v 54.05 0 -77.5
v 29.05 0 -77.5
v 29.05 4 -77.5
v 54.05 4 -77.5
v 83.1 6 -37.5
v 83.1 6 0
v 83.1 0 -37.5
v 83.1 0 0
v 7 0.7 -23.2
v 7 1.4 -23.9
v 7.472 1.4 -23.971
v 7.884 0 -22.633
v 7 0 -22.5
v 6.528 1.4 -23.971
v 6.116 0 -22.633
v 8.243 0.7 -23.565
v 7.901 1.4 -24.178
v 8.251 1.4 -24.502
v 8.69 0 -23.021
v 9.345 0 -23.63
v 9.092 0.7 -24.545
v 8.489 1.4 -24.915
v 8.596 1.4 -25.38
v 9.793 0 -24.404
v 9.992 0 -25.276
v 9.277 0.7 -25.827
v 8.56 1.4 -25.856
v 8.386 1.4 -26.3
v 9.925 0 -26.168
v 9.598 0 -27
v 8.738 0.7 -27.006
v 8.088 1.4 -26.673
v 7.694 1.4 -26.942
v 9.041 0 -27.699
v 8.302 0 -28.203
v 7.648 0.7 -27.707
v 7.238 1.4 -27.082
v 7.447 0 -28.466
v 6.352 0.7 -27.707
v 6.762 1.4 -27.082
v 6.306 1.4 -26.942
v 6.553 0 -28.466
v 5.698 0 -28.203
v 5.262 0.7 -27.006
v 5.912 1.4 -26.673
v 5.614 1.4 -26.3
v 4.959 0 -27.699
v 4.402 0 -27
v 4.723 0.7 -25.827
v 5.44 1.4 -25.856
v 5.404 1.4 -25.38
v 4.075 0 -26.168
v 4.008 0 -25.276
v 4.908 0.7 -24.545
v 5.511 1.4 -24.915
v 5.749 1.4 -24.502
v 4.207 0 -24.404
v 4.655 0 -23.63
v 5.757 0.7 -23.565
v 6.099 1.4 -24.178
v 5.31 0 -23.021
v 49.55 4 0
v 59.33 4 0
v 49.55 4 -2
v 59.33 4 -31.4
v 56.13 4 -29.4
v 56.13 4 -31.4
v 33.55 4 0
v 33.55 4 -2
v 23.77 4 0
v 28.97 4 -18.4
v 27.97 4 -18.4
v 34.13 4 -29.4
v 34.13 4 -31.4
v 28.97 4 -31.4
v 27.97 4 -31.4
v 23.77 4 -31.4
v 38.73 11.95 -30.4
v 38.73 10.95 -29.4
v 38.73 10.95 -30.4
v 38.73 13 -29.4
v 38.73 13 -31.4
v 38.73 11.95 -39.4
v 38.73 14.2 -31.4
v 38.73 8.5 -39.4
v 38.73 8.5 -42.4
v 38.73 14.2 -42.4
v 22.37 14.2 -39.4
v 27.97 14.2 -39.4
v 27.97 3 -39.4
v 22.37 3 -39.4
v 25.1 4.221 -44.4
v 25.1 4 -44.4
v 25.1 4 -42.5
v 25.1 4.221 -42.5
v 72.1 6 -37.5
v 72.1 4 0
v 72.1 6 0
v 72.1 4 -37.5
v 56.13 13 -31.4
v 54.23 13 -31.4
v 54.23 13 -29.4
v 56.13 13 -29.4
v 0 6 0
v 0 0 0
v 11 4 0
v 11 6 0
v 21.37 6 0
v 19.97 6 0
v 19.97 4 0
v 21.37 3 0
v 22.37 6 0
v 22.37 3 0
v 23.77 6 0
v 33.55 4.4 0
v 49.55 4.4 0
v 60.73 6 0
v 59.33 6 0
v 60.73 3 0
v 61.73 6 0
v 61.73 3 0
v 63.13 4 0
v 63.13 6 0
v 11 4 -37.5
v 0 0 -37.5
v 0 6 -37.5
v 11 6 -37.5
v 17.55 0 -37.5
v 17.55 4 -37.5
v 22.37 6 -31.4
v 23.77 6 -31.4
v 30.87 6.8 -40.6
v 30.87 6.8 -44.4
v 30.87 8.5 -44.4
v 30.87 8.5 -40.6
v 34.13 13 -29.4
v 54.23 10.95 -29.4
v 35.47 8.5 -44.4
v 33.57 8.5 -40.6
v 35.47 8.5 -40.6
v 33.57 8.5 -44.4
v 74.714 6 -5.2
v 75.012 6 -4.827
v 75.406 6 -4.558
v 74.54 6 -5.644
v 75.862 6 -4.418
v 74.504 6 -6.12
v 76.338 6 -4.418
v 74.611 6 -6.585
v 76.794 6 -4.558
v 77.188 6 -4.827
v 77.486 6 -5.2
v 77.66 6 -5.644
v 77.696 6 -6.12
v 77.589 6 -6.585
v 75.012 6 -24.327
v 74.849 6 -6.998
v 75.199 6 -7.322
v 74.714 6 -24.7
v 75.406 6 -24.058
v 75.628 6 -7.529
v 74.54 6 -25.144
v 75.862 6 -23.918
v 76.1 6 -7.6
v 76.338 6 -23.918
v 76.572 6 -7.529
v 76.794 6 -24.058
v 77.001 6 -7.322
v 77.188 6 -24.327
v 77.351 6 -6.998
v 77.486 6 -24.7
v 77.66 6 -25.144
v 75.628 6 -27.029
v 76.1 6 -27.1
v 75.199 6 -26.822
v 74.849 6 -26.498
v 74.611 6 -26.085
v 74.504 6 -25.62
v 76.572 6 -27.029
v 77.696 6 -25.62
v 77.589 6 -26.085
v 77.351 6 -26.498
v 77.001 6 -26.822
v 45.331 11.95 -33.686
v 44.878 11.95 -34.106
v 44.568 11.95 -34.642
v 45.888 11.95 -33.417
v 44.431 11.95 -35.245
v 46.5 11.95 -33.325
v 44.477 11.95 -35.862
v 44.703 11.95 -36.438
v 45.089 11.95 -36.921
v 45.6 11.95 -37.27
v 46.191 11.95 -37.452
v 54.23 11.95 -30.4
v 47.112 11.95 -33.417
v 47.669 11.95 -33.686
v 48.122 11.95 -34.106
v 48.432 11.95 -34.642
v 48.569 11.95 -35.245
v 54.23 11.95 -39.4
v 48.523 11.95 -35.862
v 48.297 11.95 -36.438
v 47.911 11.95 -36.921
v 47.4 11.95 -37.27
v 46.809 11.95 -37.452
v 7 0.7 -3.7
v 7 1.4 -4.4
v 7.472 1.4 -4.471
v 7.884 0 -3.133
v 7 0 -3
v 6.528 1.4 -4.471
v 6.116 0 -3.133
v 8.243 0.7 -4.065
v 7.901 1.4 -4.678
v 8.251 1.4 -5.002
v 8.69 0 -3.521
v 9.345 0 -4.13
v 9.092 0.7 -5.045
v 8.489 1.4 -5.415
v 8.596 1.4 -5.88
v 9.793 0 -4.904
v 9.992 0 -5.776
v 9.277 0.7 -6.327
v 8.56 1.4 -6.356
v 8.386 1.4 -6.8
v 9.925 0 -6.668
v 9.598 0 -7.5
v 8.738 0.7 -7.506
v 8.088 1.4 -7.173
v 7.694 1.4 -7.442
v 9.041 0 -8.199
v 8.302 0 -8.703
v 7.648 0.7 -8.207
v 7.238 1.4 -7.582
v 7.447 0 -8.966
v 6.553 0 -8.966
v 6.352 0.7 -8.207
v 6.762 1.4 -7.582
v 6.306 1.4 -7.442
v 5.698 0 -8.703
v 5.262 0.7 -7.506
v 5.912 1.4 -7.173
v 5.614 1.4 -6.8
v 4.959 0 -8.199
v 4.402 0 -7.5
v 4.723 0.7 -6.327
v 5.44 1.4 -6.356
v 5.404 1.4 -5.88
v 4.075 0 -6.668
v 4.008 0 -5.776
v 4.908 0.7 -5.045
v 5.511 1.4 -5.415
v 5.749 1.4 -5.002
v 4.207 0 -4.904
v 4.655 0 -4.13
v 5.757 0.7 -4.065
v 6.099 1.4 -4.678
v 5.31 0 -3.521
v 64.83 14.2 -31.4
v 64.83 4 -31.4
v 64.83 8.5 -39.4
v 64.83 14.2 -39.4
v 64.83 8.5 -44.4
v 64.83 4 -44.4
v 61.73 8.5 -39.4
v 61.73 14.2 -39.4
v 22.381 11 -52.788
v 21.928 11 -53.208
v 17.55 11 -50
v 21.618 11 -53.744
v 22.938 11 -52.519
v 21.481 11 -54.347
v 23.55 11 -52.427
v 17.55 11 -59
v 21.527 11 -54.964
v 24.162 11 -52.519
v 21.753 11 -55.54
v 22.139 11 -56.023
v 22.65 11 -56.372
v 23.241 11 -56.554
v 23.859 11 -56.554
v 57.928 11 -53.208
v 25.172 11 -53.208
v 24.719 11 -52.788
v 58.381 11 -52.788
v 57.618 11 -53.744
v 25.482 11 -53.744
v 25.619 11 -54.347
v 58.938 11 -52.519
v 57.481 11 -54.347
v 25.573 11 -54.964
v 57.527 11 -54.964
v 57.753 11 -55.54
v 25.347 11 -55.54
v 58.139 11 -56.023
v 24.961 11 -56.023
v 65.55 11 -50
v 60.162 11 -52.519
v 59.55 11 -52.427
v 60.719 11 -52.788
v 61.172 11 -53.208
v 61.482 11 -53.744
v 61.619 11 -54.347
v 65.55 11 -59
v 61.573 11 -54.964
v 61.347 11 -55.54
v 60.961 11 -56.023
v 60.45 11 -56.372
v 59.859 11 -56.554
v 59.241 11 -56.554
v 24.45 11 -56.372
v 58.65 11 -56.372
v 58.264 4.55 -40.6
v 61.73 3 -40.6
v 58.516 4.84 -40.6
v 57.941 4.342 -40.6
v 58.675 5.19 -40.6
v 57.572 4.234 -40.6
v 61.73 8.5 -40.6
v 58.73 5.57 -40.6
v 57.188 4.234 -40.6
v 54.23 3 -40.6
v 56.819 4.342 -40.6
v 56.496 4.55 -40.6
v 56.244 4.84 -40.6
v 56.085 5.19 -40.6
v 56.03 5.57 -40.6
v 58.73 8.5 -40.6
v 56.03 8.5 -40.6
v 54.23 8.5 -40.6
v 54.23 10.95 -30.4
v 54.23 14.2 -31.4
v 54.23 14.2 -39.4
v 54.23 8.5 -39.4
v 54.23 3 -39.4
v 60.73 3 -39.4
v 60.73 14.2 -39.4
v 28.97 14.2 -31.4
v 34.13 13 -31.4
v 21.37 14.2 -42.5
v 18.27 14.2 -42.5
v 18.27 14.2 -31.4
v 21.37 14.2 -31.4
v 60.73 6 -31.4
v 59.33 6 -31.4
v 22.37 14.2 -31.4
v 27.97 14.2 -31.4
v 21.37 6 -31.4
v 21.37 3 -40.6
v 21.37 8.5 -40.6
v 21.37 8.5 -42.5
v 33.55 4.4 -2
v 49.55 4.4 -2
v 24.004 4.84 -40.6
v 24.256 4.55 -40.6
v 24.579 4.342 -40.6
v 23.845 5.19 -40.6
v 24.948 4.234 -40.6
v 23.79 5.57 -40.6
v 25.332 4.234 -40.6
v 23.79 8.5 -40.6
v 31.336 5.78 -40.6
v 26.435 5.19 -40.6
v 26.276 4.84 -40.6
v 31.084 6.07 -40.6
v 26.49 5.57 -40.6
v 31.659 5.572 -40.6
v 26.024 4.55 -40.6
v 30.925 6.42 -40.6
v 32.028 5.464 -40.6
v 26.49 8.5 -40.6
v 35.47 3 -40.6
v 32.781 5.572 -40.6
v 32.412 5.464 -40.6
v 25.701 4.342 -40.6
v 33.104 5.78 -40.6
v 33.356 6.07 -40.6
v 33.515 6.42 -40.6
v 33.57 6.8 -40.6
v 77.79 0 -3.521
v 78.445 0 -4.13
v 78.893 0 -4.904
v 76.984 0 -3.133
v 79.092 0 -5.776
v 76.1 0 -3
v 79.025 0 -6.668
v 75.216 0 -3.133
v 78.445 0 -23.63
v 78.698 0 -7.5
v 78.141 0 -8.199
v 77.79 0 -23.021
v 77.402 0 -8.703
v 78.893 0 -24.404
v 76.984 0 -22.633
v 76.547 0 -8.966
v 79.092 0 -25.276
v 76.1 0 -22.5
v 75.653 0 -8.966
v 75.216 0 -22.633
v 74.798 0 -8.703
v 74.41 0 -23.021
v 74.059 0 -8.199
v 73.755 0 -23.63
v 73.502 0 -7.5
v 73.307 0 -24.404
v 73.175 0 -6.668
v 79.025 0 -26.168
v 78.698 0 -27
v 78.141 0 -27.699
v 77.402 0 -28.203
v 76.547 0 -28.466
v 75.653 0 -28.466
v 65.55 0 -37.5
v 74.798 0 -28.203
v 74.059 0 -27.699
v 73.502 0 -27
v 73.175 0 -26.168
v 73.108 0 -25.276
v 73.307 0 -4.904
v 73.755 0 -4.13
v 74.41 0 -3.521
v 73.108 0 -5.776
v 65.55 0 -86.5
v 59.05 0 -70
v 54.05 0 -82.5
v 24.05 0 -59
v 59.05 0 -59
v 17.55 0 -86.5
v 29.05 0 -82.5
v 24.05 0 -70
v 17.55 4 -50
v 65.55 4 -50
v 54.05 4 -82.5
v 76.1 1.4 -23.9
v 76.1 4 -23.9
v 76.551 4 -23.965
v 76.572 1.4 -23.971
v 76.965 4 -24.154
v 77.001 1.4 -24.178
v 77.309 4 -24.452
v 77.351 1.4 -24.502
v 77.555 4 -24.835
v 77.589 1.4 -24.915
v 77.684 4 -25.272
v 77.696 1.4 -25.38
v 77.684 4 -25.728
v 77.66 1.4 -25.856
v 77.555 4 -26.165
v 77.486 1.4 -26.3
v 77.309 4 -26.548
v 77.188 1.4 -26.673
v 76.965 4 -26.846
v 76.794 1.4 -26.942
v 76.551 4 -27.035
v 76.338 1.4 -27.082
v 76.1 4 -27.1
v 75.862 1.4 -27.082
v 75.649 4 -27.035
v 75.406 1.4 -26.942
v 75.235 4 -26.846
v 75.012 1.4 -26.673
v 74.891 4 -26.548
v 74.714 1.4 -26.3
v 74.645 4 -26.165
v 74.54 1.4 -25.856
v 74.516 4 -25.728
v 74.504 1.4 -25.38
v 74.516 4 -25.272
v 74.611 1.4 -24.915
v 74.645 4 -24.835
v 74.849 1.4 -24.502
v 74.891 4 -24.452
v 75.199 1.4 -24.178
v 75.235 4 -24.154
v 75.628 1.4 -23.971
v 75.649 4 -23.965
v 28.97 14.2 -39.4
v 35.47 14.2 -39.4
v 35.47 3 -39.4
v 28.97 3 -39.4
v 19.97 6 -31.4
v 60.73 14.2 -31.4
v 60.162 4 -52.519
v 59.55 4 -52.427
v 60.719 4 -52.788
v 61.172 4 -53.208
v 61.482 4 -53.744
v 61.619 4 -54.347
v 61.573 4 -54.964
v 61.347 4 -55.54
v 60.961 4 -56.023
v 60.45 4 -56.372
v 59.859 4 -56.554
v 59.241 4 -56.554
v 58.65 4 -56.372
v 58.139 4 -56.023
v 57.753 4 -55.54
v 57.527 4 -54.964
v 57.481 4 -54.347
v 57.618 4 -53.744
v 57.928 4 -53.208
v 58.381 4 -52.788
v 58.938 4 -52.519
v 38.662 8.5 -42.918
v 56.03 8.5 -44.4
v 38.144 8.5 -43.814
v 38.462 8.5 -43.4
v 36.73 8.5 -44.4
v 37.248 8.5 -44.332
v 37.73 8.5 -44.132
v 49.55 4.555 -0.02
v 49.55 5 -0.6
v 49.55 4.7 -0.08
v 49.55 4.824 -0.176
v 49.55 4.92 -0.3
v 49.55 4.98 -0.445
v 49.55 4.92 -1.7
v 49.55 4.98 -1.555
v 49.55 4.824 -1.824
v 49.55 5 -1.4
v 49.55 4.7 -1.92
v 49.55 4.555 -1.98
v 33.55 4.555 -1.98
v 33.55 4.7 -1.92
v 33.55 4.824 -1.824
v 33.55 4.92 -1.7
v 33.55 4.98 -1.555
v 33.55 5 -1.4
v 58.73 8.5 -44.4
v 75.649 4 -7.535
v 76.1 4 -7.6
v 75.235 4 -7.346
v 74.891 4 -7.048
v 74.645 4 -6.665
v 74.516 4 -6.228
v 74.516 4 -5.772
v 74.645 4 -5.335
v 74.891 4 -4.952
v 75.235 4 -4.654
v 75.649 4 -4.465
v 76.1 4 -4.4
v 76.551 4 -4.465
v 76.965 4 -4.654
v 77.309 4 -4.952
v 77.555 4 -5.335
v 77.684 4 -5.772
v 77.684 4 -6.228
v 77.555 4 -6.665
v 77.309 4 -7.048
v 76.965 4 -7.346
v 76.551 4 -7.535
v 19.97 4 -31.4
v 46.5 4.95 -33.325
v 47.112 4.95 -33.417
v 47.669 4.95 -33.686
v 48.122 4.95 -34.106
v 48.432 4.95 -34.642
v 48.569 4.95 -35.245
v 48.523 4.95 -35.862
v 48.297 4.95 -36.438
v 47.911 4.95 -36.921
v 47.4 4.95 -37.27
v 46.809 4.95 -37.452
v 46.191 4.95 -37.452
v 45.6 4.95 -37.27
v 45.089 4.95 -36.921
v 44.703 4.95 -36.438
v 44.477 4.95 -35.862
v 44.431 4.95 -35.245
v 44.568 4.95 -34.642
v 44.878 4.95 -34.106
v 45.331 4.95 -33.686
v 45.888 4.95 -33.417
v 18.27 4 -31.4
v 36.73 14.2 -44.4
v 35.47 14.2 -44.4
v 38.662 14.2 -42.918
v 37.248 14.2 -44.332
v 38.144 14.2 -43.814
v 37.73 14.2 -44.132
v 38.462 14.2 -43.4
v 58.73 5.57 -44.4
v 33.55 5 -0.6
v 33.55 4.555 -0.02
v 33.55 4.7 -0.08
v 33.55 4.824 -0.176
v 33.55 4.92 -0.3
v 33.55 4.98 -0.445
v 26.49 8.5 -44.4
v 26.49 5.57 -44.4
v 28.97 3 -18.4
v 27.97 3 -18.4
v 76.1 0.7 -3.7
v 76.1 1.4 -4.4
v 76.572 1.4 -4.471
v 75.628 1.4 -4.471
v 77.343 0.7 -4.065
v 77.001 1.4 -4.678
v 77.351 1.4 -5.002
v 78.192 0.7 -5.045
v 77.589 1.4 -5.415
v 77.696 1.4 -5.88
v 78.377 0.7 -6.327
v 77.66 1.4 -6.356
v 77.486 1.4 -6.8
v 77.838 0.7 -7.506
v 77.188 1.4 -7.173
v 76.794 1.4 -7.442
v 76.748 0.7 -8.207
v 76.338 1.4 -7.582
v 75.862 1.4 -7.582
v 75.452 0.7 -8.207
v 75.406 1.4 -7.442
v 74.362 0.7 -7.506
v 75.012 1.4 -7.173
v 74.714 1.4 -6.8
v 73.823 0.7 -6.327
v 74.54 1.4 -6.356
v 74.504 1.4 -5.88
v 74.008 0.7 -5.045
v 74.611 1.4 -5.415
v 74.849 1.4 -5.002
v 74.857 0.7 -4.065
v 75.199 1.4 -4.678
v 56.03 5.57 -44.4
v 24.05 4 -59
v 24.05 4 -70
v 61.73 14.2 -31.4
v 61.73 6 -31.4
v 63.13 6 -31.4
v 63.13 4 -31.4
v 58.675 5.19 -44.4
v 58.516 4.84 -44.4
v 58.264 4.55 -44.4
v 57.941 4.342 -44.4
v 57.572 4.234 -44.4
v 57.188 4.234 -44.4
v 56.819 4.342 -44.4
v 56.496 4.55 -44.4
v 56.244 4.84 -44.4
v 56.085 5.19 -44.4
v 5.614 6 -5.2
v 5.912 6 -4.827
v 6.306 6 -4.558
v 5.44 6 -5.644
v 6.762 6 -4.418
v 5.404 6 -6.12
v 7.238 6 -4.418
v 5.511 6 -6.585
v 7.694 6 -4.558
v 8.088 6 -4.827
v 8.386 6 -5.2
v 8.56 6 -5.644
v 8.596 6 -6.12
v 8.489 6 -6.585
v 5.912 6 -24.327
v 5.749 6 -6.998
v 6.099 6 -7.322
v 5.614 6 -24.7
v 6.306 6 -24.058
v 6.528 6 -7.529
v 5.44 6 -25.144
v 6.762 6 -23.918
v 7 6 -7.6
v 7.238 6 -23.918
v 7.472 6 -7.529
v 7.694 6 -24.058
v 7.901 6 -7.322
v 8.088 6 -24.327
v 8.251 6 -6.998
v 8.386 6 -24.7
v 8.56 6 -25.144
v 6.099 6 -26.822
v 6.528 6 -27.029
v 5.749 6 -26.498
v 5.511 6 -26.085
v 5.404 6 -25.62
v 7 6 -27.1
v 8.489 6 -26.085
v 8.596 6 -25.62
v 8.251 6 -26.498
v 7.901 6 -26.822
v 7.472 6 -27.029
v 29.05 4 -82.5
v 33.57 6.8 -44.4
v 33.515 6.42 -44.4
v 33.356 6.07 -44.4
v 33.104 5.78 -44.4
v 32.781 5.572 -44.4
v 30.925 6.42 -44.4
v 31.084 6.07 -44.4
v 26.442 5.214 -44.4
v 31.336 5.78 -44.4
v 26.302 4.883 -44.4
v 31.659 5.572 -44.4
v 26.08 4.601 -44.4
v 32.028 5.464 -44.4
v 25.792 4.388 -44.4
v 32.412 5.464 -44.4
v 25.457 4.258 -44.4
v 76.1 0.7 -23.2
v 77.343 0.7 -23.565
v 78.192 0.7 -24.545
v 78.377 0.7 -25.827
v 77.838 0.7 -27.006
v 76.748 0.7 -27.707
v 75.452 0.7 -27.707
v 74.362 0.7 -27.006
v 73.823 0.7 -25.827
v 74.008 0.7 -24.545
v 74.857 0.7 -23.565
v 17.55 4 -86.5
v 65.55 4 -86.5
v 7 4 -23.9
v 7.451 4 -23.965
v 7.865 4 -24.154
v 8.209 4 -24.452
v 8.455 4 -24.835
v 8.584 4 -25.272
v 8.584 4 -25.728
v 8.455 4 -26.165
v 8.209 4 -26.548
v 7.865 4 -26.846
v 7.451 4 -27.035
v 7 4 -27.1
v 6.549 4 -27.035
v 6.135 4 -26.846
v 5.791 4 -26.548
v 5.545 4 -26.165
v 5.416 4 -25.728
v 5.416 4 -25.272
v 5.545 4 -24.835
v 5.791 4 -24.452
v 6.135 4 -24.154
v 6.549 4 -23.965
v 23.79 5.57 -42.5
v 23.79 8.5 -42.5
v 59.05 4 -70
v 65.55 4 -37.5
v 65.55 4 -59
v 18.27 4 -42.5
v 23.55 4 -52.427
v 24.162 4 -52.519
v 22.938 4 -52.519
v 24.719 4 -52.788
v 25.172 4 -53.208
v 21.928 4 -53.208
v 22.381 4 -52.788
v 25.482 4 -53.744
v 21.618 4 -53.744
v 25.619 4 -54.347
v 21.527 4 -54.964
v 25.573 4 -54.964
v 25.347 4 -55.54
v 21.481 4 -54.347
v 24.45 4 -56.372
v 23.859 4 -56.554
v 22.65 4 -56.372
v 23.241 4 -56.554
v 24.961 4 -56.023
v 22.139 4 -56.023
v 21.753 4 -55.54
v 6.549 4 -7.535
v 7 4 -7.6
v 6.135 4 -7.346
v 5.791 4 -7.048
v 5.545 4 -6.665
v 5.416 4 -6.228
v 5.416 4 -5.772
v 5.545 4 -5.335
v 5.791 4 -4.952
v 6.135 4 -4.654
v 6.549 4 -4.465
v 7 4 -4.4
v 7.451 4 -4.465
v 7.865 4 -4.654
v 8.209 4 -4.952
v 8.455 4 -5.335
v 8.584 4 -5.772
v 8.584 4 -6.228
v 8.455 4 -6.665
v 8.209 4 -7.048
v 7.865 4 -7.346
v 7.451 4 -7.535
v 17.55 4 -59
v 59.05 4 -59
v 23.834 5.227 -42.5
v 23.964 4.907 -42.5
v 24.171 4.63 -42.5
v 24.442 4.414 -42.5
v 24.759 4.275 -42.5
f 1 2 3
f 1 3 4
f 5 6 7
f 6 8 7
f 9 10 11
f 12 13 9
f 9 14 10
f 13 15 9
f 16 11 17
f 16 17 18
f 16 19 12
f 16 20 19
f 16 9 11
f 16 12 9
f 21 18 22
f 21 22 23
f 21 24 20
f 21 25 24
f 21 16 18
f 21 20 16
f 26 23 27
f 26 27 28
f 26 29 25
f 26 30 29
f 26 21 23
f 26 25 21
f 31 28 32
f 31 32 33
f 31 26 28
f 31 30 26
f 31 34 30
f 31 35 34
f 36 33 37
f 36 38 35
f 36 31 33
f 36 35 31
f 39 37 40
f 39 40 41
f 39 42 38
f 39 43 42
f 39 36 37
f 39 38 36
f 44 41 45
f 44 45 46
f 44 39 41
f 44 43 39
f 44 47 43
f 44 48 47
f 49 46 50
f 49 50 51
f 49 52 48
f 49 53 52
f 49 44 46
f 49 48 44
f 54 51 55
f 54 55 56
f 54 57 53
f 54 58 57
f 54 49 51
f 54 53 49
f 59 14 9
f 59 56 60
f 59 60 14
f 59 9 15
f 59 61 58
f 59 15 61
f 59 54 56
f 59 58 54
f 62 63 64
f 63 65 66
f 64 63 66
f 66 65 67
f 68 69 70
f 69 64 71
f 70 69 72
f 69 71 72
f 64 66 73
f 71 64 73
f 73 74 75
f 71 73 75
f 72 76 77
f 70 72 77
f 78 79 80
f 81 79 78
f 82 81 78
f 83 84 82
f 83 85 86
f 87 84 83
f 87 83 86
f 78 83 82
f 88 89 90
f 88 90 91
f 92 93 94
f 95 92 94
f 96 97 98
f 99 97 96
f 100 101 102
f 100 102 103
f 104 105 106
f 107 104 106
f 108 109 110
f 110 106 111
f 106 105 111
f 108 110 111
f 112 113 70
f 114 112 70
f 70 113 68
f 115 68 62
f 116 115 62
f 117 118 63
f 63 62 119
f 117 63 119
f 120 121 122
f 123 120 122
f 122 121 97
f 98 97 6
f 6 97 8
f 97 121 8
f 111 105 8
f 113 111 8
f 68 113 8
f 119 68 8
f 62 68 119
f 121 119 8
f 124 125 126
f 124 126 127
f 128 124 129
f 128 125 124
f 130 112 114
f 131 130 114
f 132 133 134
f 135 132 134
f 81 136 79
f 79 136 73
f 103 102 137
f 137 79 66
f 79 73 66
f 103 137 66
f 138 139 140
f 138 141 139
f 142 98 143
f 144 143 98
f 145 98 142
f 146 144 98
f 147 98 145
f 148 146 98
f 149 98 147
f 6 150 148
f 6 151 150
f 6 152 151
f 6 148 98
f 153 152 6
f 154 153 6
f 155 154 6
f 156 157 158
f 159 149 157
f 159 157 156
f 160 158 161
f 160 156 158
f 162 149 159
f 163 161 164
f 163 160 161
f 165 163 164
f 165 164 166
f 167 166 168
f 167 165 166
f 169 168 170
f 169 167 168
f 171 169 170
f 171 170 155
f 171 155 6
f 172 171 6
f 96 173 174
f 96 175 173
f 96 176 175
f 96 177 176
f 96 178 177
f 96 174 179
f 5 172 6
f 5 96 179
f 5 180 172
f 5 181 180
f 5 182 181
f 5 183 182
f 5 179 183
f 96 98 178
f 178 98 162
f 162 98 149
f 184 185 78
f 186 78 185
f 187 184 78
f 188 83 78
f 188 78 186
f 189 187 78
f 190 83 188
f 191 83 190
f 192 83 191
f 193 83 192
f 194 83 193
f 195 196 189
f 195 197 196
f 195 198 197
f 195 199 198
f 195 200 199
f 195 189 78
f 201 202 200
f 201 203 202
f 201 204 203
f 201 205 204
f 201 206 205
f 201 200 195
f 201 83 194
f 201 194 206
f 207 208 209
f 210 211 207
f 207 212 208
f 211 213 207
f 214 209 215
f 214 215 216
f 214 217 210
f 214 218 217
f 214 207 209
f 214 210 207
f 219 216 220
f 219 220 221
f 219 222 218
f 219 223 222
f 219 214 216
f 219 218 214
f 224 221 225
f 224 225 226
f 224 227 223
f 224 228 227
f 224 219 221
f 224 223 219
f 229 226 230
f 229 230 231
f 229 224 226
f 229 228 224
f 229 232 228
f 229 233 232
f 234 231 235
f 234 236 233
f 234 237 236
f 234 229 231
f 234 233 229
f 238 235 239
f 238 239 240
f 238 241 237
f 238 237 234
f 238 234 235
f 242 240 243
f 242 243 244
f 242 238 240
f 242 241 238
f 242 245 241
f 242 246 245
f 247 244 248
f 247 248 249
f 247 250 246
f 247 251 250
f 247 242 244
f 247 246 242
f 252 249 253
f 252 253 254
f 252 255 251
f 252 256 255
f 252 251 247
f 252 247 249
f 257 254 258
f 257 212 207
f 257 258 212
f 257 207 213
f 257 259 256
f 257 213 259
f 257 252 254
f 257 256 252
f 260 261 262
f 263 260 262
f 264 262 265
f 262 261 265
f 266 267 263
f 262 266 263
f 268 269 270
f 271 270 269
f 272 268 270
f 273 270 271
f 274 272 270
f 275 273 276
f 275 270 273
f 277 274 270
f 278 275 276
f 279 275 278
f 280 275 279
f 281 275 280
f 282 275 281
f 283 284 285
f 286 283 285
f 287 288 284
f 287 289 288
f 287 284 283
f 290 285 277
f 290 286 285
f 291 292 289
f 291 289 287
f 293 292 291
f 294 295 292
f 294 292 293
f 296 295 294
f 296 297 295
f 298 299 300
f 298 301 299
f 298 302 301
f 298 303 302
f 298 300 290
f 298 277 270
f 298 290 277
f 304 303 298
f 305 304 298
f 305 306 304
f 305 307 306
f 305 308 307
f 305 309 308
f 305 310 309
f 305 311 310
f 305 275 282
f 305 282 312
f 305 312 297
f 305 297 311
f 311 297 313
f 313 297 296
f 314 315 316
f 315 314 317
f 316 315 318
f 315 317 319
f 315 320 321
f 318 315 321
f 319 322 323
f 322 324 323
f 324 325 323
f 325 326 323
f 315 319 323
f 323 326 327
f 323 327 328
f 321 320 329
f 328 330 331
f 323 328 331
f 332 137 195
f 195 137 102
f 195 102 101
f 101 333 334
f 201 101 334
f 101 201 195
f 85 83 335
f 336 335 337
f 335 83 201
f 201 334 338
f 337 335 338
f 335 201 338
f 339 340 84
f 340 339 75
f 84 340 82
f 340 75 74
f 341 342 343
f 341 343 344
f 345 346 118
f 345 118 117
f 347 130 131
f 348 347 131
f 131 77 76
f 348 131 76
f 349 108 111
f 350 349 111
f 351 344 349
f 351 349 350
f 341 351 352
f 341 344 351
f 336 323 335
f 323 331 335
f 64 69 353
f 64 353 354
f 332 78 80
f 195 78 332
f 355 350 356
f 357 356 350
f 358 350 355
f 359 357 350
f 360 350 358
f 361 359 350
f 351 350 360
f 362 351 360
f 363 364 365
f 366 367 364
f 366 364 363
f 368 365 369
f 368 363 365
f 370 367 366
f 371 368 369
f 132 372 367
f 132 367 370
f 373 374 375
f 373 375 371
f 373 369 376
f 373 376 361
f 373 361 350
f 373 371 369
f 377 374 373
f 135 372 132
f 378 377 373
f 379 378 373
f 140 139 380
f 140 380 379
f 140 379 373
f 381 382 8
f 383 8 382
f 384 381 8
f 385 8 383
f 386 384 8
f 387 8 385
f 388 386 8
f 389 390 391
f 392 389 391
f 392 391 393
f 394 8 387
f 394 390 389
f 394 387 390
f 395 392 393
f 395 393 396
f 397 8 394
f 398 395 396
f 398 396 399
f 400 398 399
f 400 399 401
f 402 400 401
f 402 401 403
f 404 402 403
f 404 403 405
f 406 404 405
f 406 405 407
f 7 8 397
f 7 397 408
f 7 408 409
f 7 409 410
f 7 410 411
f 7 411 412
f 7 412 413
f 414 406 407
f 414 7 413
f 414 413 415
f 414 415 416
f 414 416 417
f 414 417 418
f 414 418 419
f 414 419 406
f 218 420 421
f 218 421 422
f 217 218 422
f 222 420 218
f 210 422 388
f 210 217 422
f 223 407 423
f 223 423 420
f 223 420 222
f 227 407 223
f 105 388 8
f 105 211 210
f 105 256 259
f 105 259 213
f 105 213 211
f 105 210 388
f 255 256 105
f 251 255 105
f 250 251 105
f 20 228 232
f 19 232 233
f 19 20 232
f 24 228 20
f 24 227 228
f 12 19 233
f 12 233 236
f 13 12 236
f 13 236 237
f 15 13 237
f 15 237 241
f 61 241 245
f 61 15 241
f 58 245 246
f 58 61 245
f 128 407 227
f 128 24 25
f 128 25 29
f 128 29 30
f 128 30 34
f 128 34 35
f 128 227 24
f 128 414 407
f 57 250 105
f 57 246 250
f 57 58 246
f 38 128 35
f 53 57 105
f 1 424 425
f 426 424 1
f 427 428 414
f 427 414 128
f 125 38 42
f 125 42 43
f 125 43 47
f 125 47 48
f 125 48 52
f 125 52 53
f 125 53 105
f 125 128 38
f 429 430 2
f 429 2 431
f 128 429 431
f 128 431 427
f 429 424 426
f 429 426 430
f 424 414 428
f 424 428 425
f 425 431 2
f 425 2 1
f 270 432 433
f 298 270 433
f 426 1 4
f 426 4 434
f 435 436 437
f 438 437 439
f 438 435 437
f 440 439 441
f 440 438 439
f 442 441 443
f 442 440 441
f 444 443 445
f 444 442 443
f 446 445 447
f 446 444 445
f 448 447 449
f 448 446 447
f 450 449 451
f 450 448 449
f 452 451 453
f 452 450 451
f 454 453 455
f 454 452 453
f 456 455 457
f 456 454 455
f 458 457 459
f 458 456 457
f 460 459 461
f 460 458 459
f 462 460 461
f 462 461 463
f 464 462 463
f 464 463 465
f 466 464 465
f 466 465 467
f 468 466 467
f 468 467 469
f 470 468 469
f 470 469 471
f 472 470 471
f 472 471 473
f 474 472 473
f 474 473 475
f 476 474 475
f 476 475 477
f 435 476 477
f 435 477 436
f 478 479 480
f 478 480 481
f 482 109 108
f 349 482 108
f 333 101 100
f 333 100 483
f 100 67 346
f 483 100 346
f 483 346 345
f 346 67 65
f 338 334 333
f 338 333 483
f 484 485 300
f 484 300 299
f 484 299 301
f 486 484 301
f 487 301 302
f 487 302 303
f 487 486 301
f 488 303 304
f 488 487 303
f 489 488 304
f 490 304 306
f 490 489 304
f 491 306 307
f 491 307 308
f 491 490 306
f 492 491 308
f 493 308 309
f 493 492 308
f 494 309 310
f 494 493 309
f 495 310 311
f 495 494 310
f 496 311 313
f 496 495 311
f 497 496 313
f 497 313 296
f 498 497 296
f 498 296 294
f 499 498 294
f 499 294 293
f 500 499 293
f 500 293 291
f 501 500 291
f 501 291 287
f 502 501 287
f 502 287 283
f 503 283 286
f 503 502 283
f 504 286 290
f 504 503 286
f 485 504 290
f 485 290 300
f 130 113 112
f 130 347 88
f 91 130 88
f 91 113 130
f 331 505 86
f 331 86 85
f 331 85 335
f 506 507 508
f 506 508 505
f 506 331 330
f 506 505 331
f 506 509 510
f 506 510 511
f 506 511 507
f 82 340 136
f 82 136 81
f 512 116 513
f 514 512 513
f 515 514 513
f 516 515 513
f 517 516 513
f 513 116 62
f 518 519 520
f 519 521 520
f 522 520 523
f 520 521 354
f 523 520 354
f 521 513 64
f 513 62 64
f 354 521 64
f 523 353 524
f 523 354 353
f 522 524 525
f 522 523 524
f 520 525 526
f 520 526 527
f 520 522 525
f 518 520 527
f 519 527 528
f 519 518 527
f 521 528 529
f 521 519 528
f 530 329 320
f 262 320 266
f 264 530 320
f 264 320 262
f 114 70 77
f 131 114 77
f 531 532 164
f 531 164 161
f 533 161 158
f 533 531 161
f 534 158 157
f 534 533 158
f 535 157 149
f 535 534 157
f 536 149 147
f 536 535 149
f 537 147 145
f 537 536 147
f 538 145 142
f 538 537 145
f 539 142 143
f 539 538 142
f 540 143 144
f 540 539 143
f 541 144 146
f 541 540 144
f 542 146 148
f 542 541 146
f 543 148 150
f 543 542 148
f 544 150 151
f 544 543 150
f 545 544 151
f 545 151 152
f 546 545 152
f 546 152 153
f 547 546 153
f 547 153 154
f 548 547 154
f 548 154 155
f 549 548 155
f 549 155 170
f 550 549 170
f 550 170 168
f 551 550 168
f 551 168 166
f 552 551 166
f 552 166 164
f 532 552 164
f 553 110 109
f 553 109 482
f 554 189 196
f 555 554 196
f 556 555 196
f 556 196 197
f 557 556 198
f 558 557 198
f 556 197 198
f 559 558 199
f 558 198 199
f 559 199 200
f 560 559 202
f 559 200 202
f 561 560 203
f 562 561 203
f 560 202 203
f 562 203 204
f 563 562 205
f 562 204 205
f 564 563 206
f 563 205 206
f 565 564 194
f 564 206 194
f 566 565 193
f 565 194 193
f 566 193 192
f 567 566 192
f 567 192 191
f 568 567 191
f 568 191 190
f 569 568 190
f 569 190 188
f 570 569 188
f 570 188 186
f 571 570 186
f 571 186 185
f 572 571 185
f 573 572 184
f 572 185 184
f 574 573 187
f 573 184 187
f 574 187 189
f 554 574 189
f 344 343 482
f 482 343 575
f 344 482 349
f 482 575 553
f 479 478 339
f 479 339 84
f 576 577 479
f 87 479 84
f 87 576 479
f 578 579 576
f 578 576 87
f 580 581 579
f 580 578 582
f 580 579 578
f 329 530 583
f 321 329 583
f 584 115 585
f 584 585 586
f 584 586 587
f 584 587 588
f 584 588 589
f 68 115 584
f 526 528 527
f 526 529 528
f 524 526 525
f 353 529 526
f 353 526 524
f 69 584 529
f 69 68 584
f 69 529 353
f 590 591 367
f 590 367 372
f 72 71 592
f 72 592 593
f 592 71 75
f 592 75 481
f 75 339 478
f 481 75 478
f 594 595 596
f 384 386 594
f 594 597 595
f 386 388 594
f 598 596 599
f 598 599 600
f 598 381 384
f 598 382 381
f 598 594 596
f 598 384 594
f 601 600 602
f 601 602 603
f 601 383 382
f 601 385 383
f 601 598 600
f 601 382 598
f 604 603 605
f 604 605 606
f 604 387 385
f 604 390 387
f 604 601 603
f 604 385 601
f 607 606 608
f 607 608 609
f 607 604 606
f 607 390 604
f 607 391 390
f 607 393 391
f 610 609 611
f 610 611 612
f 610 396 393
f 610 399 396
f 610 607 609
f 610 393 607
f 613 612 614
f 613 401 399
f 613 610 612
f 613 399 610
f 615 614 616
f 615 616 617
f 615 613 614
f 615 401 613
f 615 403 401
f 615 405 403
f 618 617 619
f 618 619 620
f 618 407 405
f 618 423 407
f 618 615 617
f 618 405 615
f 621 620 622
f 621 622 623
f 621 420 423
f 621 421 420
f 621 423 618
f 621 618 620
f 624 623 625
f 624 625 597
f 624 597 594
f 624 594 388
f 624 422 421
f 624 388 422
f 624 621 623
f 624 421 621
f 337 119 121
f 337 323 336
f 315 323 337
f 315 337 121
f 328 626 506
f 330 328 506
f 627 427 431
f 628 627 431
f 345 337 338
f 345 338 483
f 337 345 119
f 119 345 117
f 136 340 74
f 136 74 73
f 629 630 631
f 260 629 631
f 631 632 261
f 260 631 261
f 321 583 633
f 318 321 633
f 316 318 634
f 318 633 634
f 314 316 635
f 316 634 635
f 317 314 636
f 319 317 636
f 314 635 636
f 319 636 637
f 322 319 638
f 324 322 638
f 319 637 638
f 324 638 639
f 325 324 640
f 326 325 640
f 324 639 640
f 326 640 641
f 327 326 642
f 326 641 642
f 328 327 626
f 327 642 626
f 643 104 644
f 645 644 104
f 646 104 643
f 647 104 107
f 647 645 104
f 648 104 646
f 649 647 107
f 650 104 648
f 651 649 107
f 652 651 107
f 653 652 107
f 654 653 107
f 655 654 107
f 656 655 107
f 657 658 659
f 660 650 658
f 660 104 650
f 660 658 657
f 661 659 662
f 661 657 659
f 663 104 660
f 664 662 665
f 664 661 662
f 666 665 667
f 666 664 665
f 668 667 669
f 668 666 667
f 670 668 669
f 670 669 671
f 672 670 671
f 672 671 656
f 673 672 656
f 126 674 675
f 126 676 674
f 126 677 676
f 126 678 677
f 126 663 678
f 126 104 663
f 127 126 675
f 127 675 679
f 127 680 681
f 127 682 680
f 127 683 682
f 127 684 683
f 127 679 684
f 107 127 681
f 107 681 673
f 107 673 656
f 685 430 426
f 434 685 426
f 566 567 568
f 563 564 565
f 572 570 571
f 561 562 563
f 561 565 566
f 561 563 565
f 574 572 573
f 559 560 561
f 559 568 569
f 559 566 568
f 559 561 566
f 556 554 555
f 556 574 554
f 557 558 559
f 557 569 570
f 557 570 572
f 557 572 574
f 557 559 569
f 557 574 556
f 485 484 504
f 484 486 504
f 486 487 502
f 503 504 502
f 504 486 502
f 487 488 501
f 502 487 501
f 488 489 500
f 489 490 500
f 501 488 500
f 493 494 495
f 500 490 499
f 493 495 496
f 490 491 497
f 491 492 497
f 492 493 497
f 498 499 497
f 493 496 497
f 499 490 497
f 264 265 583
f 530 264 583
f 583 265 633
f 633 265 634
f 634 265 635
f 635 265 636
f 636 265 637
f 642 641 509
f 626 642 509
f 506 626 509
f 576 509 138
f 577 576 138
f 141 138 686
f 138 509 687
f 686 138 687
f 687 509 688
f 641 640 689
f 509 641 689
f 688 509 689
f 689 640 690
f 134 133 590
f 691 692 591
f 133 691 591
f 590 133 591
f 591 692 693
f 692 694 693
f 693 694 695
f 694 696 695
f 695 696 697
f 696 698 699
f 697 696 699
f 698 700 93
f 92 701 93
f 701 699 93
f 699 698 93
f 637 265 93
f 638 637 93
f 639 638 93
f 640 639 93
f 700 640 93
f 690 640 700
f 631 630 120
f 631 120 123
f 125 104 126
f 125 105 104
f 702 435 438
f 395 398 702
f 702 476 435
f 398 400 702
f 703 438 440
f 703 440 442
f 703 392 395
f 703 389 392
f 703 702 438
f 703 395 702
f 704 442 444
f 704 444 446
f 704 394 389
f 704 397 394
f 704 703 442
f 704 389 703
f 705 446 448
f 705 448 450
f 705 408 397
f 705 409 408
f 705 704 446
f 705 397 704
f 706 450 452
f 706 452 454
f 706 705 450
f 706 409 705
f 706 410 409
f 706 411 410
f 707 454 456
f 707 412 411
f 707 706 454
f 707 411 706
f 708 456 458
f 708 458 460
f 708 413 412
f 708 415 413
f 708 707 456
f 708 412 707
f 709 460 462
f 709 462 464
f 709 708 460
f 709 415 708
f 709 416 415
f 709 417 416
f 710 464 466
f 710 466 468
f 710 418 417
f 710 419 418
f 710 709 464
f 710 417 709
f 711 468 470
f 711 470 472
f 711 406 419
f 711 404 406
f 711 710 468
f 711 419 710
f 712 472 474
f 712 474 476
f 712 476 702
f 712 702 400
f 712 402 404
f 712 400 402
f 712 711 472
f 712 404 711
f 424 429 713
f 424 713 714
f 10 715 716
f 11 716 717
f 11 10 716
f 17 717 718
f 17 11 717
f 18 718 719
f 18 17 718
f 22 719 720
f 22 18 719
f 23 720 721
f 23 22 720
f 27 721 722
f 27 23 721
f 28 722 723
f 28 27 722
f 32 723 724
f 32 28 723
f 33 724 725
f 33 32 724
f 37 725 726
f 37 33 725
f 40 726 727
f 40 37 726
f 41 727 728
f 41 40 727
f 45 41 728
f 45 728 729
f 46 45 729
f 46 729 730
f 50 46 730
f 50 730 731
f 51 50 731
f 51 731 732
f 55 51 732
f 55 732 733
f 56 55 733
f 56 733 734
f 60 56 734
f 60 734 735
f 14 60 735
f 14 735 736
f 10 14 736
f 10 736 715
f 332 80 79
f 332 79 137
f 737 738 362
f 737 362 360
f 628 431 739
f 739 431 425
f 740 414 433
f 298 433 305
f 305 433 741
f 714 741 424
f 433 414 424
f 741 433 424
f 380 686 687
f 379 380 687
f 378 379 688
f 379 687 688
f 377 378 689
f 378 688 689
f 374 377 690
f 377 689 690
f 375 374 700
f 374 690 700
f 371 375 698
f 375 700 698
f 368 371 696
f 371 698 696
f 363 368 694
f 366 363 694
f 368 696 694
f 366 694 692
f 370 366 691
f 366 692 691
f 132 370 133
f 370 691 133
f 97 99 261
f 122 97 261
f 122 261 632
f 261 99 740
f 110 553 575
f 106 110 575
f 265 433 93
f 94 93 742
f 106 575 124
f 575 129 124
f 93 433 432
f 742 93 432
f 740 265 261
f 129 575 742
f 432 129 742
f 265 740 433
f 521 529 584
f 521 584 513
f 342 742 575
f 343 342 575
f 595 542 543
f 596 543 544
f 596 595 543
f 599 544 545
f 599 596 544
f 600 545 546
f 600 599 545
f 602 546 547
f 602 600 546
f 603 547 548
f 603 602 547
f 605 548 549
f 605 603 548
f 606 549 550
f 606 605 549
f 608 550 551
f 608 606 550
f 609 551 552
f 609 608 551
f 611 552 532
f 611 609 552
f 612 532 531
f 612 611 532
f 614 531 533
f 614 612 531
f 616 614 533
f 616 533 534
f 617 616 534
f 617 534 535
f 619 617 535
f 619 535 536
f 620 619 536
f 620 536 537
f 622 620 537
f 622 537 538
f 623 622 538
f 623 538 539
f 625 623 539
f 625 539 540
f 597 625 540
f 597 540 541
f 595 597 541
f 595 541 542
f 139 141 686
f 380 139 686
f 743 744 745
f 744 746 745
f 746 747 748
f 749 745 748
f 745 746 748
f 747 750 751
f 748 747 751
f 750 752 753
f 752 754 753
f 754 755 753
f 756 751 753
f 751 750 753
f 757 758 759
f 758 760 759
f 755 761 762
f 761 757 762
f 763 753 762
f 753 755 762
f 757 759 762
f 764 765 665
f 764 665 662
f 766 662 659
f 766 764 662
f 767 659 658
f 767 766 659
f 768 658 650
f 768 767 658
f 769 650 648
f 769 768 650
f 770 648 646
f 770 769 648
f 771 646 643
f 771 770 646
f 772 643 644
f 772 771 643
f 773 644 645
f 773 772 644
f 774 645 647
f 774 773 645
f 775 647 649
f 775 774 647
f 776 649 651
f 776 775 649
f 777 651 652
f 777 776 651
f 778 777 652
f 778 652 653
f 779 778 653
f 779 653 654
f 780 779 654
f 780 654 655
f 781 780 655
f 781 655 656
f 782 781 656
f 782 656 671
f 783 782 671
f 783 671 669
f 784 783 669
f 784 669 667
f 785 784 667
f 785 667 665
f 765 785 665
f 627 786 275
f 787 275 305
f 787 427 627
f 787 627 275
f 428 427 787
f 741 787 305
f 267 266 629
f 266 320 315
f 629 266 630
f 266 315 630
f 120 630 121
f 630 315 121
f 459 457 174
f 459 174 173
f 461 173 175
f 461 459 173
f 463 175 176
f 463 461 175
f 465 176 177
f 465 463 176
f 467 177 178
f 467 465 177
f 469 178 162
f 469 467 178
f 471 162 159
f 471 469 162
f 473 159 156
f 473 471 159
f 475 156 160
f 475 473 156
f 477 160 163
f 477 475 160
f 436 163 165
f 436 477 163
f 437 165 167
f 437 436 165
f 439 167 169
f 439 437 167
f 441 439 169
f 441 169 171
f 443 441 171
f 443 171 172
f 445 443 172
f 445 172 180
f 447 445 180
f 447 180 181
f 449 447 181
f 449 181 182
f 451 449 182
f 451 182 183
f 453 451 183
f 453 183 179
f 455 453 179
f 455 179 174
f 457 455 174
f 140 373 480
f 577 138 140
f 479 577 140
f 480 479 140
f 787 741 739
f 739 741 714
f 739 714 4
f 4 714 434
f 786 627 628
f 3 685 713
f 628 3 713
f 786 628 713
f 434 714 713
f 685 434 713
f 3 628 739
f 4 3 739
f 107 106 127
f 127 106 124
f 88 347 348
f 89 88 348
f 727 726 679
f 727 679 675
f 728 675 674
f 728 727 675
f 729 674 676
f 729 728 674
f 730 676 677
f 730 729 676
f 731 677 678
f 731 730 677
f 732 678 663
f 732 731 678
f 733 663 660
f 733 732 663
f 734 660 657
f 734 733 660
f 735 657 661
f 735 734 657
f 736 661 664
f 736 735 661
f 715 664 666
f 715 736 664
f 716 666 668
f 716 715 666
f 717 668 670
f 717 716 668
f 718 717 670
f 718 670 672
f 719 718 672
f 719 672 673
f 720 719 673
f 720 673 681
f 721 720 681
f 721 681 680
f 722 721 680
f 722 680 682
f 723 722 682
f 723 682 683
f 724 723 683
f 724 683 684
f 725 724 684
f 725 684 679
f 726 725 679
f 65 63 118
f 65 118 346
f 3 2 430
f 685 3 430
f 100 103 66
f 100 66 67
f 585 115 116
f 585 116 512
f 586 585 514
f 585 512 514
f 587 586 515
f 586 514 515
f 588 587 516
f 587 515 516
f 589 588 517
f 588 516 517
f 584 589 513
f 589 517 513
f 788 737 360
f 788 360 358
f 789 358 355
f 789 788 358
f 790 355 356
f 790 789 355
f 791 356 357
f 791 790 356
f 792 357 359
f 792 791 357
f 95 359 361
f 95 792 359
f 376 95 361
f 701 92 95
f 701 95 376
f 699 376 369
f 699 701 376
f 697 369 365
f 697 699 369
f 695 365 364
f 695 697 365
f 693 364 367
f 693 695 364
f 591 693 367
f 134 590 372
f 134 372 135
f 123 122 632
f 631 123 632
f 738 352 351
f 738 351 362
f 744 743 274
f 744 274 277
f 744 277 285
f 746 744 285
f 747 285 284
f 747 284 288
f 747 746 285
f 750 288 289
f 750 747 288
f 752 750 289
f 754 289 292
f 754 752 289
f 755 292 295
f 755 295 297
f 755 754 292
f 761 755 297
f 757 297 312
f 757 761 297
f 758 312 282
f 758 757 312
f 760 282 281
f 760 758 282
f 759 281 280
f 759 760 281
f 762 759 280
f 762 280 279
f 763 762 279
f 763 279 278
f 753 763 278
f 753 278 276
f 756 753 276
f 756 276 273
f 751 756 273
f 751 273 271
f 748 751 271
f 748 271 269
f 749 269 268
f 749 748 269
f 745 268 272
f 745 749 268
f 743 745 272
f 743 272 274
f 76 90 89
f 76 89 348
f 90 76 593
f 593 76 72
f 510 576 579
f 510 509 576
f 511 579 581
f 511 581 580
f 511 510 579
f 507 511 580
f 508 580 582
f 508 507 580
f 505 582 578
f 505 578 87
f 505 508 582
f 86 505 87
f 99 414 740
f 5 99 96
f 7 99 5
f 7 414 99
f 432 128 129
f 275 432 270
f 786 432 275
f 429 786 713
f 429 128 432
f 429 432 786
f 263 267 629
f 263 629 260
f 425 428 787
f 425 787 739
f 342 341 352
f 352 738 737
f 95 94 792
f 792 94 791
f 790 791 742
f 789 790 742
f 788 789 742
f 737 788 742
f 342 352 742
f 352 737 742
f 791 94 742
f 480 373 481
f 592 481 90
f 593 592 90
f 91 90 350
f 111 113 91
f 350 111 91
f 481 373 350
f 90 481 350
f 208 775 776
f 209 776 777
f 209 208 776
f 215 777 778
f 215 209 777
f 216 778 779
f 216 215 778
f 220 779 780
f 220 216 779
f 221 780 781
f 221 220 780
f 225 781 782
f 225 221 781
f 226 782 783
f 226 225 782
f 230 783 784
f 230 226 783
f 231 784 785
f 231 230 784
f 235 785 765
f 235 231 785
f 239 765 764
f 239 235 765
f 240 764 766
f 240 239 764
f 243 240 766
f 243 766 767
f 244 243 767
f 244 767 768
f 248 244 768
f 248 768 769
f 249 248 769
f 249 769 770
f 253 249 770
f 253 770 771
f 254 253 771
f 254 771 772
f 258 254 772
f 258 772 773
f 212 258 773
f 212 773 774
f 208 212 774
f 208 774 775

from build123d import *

# Parameters (mm, degrees)
SKETCH1_R           = 1.6
SKETCH1_W           = 25
SKETCH1_H           = 5
SKETCH1_W_2         = 35
SKETCH1_H_2         = 11
BOSS_EXTRUDE1_DEPTH = 4
CHAMFER1_SIZE       = 1.4
SKETCH2_W           = 48
SKETCH2_H           = 9
SKETCH2_R           = 2.075
BOSS_EXTRUDE2_DEPTH = 7
SKETCH3_W           = 11
SKETCH3_H           = 37.5
SKETCH3_R           = 1.6
BOSS_EXTRUDE3_DEPTH = 2
SKETCH4_W           = 5.6
SKETCH4_H           = 8
BOSS_EXTRUDE4_DEPTH = 10.2
SKETCH5_W           = 1.4
SKETCH5_H           = 31.4
BOSS_EXTRUDE5_DEPTH = 2
CUT_EXTRUDE1_DEPTH  = 1
SKETCH8_W           = 26.1
SKETCH8_H           = 5
CUT_EXTRUDE2_DEPTH  = 5.7
SKETCH9_W           = 15.5
SKETCH9_H           = 10
CUT_EXTRUDE3_DEPTH  = 2.25
SKETCH10_W          = 4.6
SKETCH10_H          = 2
SKETCH10_W_2        = 1.9
CUT_EXTRUDE4_DEPTH  = 1.2
SKETCH11_W          = 15.5
SKETCH11_H          = 1
CUT_EXTRUDE5_DEPTH  = 1
SKETCH12_R          = 2.075
CUT_EXTRUDE6_DEPTH  = 7
FILLET1_R           = 2
CUT_EXTRUDE7_REACH  = 97.282
SKETCH14_W          = 16
SKETCH14_H          = 2
BOSS_EXTRUDE6_DEPTH = 1
FILLET2_R           = 0.6


with BuildPart() as part:
    # Sketch1 → Boss-Extrude1 (new body)
    with BuildSketch(Plane(origin=(0, 0, 0), x_dir=(1, 0, 0), z_dir=(0, 1, 0))):
        Polygon((0, 0), (0, 37.5), (17.55, 37.5), (17.55, 86.5), (65.55, 86.5), (65.55, 37.5), (83.1, 37.5), (83.1, 0), align=None)
        with Locations(Location((7, 25.5, 0), (0, 0, 270))):
            Circle(SKETCH1_R, mode=Mode.SUBTRACT)
        with Locations(Location((7, 6, 0), (0, 0, 270))):
            Circle(SKETCH1_R, mode=Mode.SUBTRACT)
        with Locations(Location((76.1, 6, 0), (0, 0, 270))):
            Circle(SKETCH1_R, mode=Mode.SUBTRACT)
        with Locations(Location((76.1, 25.5, 0), (0, 0, 270))):
            Circle(SKETCH1_R, mode=Mode.SUBTRACT)
        with Locations((41.55, 80)):
            Rectangle(SKETCH1_W, SKETCH1_H, mode=Mode.SUBTRACT)
        with Locations((41.55, 64.5)):
            Rectangle(SKETCH1_W_2, SKETCH1_H_2, mode=Mode.SUBTRACT)
    extrude(amount=BOSS_EXTRUDE1_DEPTH)

    # Chamfer1
    chamfer1_edges = [part.edges().sort_by_distance(p)[0] for p in [
        (7, 0, -27.1),
        (7, 0, -7.6),
        (76.1, 0, -7.6),
        (76.1, 0, -27.1),
    ]]
    chamfer(chamfer1_edges, length=CHAMFER1_SIZE)

    # Sketch2 → Boss-Extrude2 (add)
    with BuildSketch(Plane(origin=(0, 4, 0), x_dir=(1, 0, 0), z_dir=(0, 1, 0))):
        with Locations((41.55, 54.5)):
            Rectangle(SKETCH2_W, SKETCH2_H)
        with Locations(Location((23.55, 54.502162277, 0), (0, 0, 270))):
            Circle(SKETCH2_R, mode=Mode.SUBTRACT)
        with Locations(Location((59.55, 54.502162277, 0), (0, 0, 270))):
            Circle(SKETCH2_R, mode=Mode.SUBTRACT)
    extrude(amount=BOSS_EXTRUDE2_DEPTH)

    # Sketch3 → Boss-Extrude3 (add)
    # profile 1 of 2: a face of its own
    with BuildSketch(Plane(origin=(0, 4, 0), x_dir=(1, 0, 0), z_dir=(0, 1, 0))):
        with Locations((5.5, 18.75)):
            Rectangle(SKETCH3_W, SKETCH3_H)
        with Locations(Location((7, 25.5, 0), (0, 0, 90))):
            Circle(SKETCH3_R, mode=Mode.SUBTRACT)
        with Locations(Location((7, 6, 0), (0, 0, 90))):
            Circle(SKETCH3_R, mode=Mode.SUBTRACT)
    # profile 2 of 2: a face of its own
    with BuildSketch(Plane(origin=(0, 4, 0), x_dir=(1, 0, 0), z_dir=(0, 1, 0))):
        with Locations((77.6, 18.75)):
            Rectangle(SKETCH3_W, SKETCH3_H)
        with Locations(Location((76.1, 6, 0), (0, 0, 90))):
            Circle(SKETCH3_R, mode=Mode.SUBTRACT)
        with Locations(Location((76.1, 25.5, 0), (0, 0, 90))):
            Circle(SKETCH3_R, mode=Mode.SUBTRACT)
    extrude(amount=BOSS_EXTRUDE3_DEPTH)

    # Sketch4 → Boss-Extrude4 (add)
    with BuildSketch(Plane(origin=(0, 4, 0), x_dir=(1, 0, 0), z_dir=(0, 1, 0))):
        Polygon((18.27, 42.5), (18.27, 31.4), (21.37, 31.4), (21.37, 40.6), (35.47, 40.6), (35.47, 39.4), (28.97, 39.4), (28.97, 31.4), (34.13, 31.4), (34.13, 29.4), (56.13, 29.4), (56.13, 31.4), (60.73, 31.4), (60.73, 39.4), (54.23, 39.4), (54.23, 40.6), (61.73, 40.6), (61.73, 31.4), (64.83, 31.4), (64.83, 44.4), (25.1, 44.4), (25.1, 42.5), align=None)
        with Locations((25.17, 35.4)):
            Rectangle(SKETCH4_W, SKETCH4_H)
    extrude(amount=BOSS_EXTRUDE4_DEPTH)

    # Sketch5 → Boss-Extrude5 (add)
    with BuildSketch(Plane(origin=(0, 4, 0), x_dir=(1, 0, 0), z_dir=(0, 1, 0))):
        with Locations((20.67, 15.7)):
            Rectangle(SKETCH5_W, SKETCH5_H)
        with Locations((23.07, 15.7)):
            Rectangle(SKETCH5_W, SKETCH5_H)
        with Locations((60.03, 15.7)):
            Rectangle(SKETCH5_W, SKETCH5_H)
        with Locations((62.43, 15.7)):
            Rectangle(SKETCH5_W, SKETCH5_H)
    extrude(amount=BOSS_EXTRUDE5_DEPTH)

    # Sketch7 → Cut-Extrude1 (cut)
    with BuildSketch(Plane(origin=(0, 4, 0), x_dir=(1, 0, 0), z_dir=(0, 1, 0))):
        Polygon((28.97, 31.4), (28.97, 18.4), (27.97, 18.4), (27.97, 31.4), (27.97, 39.4), (22.37, 39.4), (22.37, 0), (21.37, 0), (21.37, 40.6), (35.47, 40.6), (35.47, 39.4), (28.97, 39.4), align=None)
        Polygon((60.73, 0), (61.73, 0), (61.73, 40.6), (54.23, 40.6), (54.23, 39.4), (60.73, 39.4), align=None)
    extrude(amount=-CUT_EXTRUDE1_DEPTH, mode=Mode.SUBTRACT)

    # Sketch8 → Cut-Extrude2 (cut)
    with BuildSketch(Plane(origin=(0, 14.2, 0), x_dir=(1, 0, 0), z_dir=(0, 1, 0))):
        Polygon((35.47, 40.6), (35.47, 44.4), (25.1, 44.4), (25.1, 42.5), (21.37, 42.5), (21.37, 40.6), align=None)
        with Locations((51.78, 41.9)):
            Rectangle(SKETCH8_W, SKETCH8_H)
    extrude(amount=-CUT_EXTRUDE2_DEPTH, mode=Mode.SUBTRACT)

    # Sketch9 → Cut-Extrude3 (cut)
    with BuildSketch(Plane(origin=(0, 14.2, 0), x_dir=(1, 0, 0), z_dir=(0, 1, 0))):
        with Locations((46.48, 34.4)):
            Rectangle(SKETCH9_W, SKETCH9_H)
    extrude(amount=-CUT_EXTRUDE3_DEPTH, mode=Mode.SUBTRACT)

    # Sketch10 → Cut-Extrude4 (cut)
    with BuildSketch(Plane(origin=(0, 14.2, 0), x_dir=(1, 0, 0), z_dir=(0, 1, 0))):
        with Locations((36.43, 30.4)):
            Rectangle(SKETCH10_W, SKETCH10_H)
        with Locations((55.18, 30.4)):
            Rectangle(SKETCH10_W_2, SKETCH10_H)
    extrude(amount=-CUT_EXTRUDE4_DEPTH, mode=Mode.SUBTRACT)

    # Sketch11 → Cut-Extrude5 (cut)
    with BuildSketch(Plane(origin=(0, 11.95, 0), x_dir=(1, 0, 0), z_dir=(0, 1, 0))):
        with Locations((46.48, 29.9)):
            Rectangle(SKETCH11_W, SKETCH11_H)
    extrude(amount=-CUT_EXTRUDE5_DEPTH, mode=Mode.SUBTRACT)

    # Sketch12 → Cut-Extrude6 (cut)
    with BuildSketch(Plane(origin=(0, 11.95, 0), x_dir=(1, 0, 0), z_dir=(0, 1, 0))):
        with Locations(Location((46.5, 35.4, 0), (0, 0, 270))):
            Circle(SKETCH12_R)
    extrude(amount=-CUT_EXTRUDE6_DEPTH, mode=Mode.SUBTRACT)

    # Fillet1
    fillet1_edges = [part.edges().sort_by_distance(p)[0] for p in [
        (38.73, 11.35, -44.4),
    ]]
    fillet(fillet1_edges, radius=FILLET1_R)

    # Sketch13 → Cut-Extrude7 (cut, up to next)
    with BuildSketch(Plane(origin=(0, 0, -44.4), x_dir=(-1, 0, 0), z_dir=(0, 0, -1)), mode=Mode.PRIVATE) as cut_extrude7_sk1:
        with BuildLine():
            Line((-58.73, 8.5), (-58.73, 5.57))
            ThreePointArc((-58.73, 5.57), (-57.38, 4.22), (-56.03, 5.57))
            Line((-56.03, 5.57), (-56.03, 8.5))
            Line((-56.03, 8.5), (-58.73, 8.5))
        make_face()
    cut_extrude7_tool1 = extrude(cut_extrude7_sk1.sketch, amount=-CUT_EXTRUDE7_REACH, mode=Mode.PRIVATE) & part.part
    # Sketch13 → Cut-Extrude7 (cut, up to next)
    with BuildSketch(Plane(origin=(0, 0, -44.4), x_dir=(-1, 0, 0), z_dir=(0, 0, -1)), mode=Mode.PRIVATE) as cut_extrude7_sk2:
        with BuildLine():
            Line((-33.57, 8.5), (-33.57, 6.8))
            ThreePointArc((-33.57, 6.8), (-32.22, 5.45), (-30.87, 6.8))
            Line((-30.87, 6.8), (-30.87, 8.5))
            Line((-30.87, 8.5), (-33.57, 8.5))
        make_face()
    cut_extrude7_tool2 = extrude(cut_extrude7_sk2.sketch, amount=-CUT_EXTRUDE7_REACH, mode=Mode.PRIVATE) & part.part
    # Sketch13 → Cut-Extrude7 (cut, up to next)
    with BuildSketch(Plane(origin=(0, 0, -44.4), x_dir=(-1, 0, 0), z_dir=(0, 0, -1)), mode=Mode.PRIVATE) as cut_extrude7_sk3:
        with BuildLine():
            Line((-26.49, 5.57), (-26.49, 8.5))
            Line((-26.49, 8.5), (-23.79, 8.5))
            Line((-23.79, 8.5), (-23.79, 5.57))
            ThreePointArc((-23.79, 5.57), (-25.14, 4.22), (-26.49, 5.57))
        make_face()
    cut_extrude7_tool3 = extrude(cut_extrude7_sk3.sketch, amount=-CUT_EXTRUDE7_REACH, mode=Mode.PRIVATE) & part.part
    add(cut_extrude7_tool1.solids().sort_by_distance((57.38, 6.49348, -44.4))[0], mode=Mode.SUBTRACT)
    add(cut_extrude7_tool2.solids().sort_by_distance((32.22, 7.10341, -44.4))[0], mode=Mode.SUBTRACT)
    add(cut_extrude7_tool3.solids().sort_by_distance((25.14, 6.49348, -44.4))[0], mode=Mode.SUBTRACT)

    # Sketch14 → Boss-Extrude6 (add)
    with BuildSketch(Plane(origin=(0, 4, 0), x_dir=(1, 0, 0), z_dir=(0, 1, 0))):
        with Locations((41.55, 1)):
            Rectangle(SKETCH14_W, SKETCH14_H)
    extrude(amount=BOSS_EXTRUDE6_DEPTH)

    # Fillet2
    fillet2_edges = [part.edges().sort_by_distance(p)[0] for p in [
        (41.55, 5, 0),
        (41.55, 5, -2),
    ]]
    fillet(fillet2_edges, radius=FILLET2_R)


solid = part.part
